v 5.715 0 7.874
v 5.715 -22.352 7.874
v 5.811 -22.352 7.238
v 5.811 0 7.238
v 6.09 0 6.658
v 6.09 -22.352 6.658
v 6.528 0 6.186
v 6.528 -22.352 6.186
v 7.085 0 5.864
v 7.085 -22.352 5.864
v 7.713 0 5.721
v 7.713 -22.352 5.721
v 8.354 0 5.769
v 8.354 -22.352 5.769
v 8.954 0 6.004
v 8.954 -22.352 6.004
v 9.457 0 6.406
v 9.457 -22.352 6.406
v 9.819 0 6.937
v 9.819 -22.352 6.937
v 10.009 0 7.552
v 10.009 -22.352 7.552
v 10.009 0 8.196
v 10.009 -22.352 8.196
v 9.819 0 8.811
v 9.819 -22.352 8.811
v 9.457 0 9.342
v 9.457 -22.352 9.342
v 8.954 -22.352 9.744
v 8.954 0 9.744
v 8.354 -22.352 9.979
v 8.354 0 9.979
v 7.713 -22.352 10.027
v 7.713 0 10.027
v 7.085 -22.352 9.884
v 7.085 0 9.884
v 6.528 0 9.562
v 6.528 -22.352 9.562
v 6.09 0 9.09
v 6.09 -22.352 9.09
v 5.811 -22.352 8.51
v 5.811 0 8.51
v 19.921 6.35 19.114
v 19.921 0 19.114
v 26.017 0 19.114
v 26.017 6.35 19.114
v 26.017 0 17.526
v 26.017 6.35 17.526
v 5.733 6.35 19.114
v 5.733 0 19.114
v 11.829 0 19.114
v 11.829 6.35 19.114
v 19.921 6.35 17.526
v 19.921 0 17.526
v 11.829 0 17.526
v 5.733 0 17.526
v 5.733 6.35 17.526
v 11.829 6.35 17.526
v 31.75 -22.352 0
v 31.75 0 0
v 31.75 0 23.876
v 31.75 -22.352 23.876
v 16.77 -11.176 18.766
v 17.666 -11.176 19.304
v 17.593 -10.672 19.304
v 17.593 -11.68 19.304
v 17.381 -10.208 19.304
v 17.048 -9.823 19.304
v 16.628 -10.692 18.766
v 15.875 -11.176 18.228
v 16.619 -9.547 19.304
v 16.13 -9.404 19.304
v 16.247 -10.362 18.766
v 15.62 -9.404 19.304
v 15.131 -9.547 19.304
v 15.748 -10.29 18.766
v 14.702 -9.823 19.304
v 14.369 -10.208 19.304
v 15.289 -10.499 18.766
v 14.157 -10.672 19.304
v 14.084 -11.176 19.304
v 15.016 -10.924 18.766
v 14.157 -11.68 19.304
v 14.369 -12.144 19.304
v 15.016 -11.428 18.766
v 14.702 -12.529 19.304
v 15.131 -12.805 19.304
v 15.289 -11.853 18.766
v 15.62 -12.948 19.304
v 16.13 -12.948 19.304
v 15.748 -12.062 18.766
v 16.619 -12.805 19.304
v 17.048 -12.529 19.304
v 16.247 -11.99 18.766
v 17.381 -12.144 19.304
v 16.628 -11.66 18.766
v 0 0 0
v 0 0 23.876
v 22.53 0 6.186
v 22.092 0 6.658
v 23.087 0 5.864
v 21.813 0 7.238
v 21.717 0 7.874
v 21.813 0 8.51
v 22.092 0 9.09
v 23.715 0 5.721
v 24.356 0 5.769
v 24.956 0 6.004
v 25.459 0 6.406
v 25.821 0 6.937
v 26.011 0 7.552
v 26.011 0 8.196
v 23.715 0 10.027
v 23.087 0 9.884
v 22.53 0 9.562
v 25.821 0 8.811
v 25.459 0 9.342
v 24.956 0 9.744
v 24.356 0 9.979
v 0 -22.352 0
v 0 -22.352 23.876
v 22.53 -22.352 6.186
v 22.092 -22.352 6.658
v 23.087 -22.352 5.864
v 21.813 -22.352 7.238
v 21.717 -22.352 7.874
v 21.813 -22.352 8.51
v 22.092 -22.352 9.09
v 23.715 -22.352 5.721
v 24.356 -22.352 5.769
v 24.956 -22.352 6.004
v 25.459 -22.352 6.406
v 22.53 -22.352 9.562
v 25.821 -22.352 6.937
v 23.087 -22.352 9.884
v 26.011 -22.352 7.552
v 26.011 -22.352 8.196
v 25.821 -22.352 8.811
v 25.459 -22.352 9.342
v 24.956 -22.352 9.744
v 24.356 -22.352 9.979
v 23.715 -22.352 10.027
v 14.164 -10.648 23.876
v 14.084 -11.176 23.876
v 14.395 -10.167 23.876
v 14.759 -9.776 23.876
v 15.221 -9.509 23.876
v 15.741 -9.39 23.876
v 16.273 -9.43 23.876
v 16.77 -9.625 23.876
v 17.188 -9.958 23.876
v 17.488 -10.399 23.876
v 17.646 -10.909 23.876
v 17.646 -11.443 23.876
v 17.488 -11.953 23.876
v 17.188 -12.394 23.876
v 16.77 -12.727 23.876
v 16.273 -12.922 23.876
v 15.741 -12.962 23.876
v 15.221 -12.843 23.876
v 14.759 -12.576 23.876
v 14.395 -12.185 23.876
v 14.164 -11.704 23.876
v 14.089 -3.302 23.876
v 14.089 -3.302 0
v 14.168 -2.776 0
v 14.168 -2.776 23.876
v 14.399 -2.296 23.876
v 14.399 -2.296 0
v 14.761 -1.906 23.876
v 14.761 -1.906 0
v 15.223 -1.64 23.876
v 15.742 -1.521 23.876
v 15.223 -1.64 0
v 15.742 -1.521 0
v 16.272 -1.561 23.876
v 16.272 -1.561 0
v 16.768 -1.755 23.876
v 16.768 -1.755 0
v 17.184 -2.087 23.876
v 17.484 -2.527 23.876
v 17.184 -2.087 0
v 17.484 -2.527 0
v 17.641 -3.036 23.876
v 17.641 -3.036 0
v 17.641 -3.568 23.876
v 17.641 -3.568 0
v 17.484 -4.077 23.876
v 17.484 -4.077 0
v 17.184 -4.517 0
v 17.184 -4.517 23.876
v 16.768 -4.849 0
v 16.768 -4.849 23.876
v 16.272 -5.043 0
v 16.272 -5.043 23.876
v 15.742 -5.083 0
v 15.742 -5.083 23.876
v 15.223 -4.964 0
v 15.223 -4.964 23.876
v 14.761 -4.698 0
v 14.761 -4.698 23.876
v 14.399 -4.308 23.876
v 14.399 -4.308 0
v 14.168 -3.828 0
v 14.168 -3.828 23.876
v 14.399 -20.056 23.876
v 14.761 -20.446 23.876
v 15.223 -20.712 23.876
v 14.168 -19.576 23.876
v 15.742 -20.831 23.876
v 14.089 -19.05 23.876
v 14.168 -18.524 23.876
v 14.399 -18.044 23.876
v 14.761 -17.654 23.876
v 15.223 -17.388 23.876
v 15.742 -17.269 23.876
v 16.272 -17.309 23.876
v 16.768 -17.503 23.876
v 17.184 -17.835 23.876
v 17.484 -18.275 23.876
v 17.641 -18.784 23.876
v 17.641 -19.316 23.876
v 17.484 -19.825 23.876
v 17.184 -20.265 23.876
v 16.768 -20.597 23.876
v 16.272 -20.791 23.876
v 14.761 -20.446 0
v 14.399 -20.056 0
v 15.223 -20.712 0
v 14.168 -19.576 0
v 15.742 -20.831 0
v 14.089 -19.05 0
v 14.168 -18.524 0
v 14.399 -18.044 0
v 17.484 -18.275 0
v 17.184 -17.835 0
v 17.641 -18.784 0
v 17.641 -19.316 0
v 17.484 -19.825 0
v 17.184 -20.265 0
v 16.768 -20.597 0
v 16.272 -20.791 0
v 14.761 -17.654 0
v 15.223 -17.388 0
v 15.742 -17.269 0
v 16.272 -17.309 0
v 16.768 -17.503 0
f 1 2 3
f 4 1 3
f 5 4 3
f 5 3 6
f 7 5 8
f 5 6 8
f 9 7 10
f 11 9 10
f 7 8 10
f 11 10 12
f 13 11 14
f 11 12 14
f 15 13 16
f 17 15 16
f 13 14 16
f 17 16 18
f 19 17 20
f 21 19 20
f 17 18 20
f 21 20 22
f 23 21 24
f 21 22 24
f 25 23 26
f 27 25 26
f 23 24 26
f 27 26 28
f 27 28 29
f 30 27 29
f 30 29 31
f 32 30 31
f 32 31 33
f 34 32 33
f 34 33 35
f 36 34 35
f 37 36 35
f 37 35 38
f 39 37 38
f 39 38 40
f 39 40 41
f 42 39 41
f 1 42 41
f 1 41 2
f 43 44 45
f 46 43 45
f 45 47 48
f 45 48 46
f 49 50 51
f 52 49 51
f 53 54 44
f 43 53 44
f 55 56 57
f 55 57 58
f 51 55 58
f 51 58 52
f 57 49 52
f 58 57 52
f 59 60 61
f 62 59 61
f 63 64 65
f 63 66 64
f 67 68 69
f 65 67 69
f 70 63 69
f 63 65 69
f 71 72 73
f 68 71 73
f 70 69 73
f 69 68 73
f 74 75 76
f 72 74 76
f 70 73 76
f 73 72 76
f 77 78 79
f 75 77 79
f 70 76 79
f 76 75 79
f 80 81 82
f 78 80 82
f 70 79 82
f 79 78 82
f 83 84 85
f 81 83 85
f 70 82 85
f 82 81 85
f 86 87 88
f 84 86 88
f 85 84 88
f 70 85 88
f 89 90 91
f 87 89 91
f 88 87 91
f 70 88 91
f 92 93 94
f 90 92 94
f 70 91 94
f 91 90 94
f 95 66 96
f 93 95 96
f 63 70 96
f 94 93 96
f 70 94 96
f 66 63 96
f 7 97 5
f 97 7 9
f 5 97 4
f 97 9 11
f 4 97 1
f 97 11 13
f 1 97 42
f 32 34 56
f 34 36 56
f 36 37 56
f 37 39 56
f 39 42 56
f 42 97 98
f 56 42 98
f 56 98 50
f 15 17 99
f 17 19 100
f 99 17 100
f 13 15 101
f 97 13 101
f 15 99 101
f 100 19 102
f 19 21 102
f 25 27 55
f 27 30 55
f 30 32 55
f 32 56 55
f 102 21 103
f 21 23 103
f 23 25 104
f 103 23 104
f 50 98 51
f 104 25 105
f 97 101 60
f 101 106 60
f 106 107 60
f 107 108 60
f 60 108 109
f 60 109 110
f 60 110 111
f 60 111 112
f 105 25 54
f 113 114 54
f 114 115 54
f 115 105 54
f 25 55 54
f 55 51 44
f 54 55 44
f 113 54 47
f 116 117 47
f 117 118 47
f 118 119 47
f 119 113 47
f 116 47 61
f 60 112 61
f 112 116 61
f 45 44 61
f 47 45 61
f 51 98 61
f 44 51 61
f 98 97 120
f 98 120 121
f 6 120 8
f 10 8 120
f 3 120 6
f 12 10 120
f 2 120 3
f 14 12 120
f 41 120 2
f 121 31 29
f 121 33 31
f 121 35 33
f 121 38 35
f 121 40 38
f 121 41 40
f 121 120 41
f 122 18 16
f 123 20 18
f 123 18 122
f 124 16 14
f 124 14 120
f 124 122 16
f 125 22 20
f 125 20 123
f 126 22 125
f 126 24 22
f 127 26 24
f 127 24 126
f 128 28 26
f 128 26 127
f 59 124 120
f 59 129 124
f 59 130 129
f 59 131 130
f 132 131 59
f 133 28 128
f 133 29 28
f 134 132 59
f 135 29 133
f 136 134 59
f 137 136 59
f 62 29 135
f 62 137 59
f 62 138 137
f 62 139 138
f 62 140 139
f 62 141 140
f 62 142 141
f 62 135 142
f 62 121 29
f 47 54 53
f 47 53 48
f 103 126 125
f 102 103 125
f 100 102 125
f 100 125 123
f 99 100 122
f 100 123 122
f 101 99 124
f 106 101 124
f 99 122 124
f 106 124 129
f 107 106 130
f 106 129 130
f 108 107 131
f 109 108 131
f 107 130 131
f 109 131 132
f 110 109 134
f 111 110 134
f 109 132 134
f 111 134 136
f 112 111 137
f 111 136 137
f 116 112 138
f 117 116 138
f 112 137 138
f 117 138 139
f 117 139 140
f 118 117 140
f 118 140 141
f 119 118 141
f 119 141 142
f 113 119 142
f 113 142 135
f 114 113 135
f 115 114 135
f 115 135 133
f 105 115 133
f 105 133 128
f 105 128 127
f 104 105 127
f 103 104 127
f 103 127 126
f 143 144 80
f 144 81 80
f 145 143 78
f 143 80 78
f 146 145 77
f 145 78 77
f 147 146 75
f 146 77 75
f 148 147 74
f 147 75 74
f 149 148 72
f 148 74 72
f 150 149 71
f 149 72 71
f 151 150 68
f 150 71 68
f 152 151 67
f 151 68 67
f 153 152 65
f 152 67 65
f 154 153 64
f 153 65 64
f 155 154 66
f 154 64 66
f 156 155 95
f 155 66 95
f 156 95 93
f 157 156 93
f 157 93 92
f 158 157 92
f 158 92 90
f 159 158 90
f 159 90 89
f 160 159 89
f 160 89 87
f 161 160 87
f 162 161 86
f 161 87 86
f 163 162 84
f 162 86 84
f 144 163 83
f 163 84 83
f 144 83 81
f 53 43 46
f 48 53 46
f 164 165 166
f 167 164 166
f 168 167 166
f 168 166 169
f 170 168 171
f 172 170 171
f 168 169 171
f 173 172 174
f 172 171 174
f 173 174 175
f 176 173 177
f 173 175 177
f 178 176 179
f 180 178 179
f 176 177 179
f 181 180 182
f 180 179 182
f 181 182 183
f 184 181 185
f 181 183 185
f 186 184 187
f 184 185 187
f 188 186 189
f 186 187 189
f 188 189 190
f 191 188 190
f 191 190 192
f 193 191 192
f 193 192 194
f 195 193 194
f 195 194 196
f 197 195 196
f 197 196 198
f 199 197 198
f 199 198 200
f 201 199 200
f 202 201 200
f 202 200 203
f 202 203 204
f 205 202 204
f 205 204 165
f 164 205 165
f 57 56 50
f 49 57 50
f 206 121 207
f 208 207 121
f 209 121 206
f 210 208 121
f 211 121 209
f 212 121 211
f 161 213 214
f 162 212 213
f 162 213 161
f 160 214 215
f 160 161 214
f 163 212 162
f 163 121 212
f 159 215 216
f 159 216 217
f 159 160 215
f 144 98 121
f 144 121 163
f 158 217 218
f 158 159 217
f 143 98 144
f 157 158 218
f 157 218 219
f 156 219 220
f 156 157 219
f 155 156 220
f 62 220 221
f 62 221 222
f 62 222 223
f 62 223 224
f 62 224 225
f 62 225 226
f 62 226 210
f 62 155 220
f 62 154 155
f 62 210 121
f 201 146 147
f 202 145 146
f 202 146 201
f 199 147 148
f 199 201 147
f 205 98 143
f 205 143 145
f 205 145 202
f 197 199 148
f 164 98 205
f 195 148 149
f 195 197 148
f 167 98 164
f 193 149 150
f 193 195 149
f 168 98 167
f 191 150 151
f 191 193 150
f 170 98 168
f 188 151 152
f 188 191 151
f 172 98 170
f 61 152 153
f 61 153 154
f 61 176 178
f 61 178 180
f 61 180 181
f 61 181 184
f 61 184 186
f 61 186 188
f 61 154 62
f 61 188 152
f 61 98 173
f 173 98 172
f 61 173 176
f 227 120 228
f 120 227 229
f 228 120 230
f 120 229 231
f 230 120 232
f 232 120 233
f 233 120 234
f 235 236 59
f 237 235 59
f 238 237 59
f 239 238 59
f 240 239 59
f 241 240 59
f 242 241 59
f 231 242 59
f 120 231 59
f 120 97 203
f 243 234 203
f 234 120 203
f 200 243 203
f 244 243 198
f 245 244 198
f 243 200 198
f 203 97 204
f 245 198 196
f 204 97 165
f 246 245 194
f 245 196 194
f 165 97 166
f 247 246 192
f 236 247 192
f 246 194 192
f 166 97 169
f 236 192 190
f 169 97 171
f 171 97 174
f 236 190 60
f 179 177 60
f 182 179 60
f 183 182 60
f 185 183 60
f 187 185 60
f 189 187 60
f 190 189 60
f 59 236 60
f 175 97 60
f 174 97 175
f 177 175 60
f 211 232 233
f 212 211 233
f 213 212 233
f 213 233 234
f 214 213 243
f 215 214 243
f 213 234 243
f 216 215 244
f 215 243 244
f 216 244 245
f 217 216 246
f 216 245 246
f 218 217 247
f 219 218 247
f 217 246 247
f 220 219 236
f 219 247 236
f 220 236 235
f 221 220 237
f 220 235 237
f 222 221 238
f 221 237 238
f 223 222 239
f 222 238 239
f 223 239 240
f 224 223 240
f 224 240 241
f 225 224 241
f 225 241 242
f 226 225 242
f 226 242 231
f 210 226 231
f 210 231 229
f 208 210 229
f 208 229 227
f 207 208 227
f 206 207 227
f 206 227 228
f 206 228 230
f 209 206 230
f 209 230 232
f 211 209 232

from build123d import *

# Parameters (mm, degrees)
F0_W     = 31.75
F0_H     = 23.876
F0_W_2   = 6.096
F0_H_2   = 1.5875
F1_DEPTH = 22.352
F2_DEPTH = 6.35
F3_D     = 4.318
F5_D     = 3.571875
F6_D     = 3.5814
F6_DEPTH = 4.572
F6_TIP   = 1.0759611105


with BuildPart() as f1:
    # F0 (on Front) → F1 (new body)
    with BuildSketch(Plane.XZ):
        with Locations((15.875, 11.938)):
            Rectangle(F0_W, F0_H)
        with Locations((8.780638318, 18.31975)):
            Rectangle(F0_W_2, F0_H_2, mode=Mode.SUBTRACT)
        with Locations((22.969361682, 18.31975)):
            Rectangle(F0_W_2, F0_H_2, mode=Mode.SUBTRACT)
        with Locations((8.780638318, 18.31975)):
            Rectangle(F0_W_2, F0_H_2)
        with Locations((22.969361682, 18.31975)):
            Rectangle(F0_W_2, F0_H_2)
    extrude(amount=F1_DEPTH)

    # F0 (on Front) → F2 (join)
    with BuildSketch(Plane.XZ):
        with Locations((22.969361682, 18.31975)):
            Rectangle(F0_W_2, F0_H_2)
        with Locations((8.780638318, 18.31975)):
            Rectangle(F0_W_2, F0_H_2)
    extrude(amount=-F2_DEPTH)

    # F3 (through all)
    with Locations(Plane(origin=(0, 0, 0), x_dir=(1, 0, 0), z_dir=(0, 1, 0))):
        with Locations((7.874, -7.874), (23.876, -7.874)):
            Hole(F3_D / 2)

    # F5 (through all)
    with Locations(Plane.XY.offset(23.876)):
        with Locations((15.875, -3.302), (15.875, -19.05)):
            Hole(F5_D / 2)

    # F6
    with Locations(Plane.XY.offset(23.876)):
        with Locations((15.875, -11.176)):
            Hole(F6_D / 2, depth=F6_DEPTH)
            with Locations((0, 0, -(F6_DEPTH + F6_TIP / 2))):  # 118° drill point
                Cone(0, F6_D / 2, F6_TIP, mode=Mode.SUBTRACT)


solid = f1.part
